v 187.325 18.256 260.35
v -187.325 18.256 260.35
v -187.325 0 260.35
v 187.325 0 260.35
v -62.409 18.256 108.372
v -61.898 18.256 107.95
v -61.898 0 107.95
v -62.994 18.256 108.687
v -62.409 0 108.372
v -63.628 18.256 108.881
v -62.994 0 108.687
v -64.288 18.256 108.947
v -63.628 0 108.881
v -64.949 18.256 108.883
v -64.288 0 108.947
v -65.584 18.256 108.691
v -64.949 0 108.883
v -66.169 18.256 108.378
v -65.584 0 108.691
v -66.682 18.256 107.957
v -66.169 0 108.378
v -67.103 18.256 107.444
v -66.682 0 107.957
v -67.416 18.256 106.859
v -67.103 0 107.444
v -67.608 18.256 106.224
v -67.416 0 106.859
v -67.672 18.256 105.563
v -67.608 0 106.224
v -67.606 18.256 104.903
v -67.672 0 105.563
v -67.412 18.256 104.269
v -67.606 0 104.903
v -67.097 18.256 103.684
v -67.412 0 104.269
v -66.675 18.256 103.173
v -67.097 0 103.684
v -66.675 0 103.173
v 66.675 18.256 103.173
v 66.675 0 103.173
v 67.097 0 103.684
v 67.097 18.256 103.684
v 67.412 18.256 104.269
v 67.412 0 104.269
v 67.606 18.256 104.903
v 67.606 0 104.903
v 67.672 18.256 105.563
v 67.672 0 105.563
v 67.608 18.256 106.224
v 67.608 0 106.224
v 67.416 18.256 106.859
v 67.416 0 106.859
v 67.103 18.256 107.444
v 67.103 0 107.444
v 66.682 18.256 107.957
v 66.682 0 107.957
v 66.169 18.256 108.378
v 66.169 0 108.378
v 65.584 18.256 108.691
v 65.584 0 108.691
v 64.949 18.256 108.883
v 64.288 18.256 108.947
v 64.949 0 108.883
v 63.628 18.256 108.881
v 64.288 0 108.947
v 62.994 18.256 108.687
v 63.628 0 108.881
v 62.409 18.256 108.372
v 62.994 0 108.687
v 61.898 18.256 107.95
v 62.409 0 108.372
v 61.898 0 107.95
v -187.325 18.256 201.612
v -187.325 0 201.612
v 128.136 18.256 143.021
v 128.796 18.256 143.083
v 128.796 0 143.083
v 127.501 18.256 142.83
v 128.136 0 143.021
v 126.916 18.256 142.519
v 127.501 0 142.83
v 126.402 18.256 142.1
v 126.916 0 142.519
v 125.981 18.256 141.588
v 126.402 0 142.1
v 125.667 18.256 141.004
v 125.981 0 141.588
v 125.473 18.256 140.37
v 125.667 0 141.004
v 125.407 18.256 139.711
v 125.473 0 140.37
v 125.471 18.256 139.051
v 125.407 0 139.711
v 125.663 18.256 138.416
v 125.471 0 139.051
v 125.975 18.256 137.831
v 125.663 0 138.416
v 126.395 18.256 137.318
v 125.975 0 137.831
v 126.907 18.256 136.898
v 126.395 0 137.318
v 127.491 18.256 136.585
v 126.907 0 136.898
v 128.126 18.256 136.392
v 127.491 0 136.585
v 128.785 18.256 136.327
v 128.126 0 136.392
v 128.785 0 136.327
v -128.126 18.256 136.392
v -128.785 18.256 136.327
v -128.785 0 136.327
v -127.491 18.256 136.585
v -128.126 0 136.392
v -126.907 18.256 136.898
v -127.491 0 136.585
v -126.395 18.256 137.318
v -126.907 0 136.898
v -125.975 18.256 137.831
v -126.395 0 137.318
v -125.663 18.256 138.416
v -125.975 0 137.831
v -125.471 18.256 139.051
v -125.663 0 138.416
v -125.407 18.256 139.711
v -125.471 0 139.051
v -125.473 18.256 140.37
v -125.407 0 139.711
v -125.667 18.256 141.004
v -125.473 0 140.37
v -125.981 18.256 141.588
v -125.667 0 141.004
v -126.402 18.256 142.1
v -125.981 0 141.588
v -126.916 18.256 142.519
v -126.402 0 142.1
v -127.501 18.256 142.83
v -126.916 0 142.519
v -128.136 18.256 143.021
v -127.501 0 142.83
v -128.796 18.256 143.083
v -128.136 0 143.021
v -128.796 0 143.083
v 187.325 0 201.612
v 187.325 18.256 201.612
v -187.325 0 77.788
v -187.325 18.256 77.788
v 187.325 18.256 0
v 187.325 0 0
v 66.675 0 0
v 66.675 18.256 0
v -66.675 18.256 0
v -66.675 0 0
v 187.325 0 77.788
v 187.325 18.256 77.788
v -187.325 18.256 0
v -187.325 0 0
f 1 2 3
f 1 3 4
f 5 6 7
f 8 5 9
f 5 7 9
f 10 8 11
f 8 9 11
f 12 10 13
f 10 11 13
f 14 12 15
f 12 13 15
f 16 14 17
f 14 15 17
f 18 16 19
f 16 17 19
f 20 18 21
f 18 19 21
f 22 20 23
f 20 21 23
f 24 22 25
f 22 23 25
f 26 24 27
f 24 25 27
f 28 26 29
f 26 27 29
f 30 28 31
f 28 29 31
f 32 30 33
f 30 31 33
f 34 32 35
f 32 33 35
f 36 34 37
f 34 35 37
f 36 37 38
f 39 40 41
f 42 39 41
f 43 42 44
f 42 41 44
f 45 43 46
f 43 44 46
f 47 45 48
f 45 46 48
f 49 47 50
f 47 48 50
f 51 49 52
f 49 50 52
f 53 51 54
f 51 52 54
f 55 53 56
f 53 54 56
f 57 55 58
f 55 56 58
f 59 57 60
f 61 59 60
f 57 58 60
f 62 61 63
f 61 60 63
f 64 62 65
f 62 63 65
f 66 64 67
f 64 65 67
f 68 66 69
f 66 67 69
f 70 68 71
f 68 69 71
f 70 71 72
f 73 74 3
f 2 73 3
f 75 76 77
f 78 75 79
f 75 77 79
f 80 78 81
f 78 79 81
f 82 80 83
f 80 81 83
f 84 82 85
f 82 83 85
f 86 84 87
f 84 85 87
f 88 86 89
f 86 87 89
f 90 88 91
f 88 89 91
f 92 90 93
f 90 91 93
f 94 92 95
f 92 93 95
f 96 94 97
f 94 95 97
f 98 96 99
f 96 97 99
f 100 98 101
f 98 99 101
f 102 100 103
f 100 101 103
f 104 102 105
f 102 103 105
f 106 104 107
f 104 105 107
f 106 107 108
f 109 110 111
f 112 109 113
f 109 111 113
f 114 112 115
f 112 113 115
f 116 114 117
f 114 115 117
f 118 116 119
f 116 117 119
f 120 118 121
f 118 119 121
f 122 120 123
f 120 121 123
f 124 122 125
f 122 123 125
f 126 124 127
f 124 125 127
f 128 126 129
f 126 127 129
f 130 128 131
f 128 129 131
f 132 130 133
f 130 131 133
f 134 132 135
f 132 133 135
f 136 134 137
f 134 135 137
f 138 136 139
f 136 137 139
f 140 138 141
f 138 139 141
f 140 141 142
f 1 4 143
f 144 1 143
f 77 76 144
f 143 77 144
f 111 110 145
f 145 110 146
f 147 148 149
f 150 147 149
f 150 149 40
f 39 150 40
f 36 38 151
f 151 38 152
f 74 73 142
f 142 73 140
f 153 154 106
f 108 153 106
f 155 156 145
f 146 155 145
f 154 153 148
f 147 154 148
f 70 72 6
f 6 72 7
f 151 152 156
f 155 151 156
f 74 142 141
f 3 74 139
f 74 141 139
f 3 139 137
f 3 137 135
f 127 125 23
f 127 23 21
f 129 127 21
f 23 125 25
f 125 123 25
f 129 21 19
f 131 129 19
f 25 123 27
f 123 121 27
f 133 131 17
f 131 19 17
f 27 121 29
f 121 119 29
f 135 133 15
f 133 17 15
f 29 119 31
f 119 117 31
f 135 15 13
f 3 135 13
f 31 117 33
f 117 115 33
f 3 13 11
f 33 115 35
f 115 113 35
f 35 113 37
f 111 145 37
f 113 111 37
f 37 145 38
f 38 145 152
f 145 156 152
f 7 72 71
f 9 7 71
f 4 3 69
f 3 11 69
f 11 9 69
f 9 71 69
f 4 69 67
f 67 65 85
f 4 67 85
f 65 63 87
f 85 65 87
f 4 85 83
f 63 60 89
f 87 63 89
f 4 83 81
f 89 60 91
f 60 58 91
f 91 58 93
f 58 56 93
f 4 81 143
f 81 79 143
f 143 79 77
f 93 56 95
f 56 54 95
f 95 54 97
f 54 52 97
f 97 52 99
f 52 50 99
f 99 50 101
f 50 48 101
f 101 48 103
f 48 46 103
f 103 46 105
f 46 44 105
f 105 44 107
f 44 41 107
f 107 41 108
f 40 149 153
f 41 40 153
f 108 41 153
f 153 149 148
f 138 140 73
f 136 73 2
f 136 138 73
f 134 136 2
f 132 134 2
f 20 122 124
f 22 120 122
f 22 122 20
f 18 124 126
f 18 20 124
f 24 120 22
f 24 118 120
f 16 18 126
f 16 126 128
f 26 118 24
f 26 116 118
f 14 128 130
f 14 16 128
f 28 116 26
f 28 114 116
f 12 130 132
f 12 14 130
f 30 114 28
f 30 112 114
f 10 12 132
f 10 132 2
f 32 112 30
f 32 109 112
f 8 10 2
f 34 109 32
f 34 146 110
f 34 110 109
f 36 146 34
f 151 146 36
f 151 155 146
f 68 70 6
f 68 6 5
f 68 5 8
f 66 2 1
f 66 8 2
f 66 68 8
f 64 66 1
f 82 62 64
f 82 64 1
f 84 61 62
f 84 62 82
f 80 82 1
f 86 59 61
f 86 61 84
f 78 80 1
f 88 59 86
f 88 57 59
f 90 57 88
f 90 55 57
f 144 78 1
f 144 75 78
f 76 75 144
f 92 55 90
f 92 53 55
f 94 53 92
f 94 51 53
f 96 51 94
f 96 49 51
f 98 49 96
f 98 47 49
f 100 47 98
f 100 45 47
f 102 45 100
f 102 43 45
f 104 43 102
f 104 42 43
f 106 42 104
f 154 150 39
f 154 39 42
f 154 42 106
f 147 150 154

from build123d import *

# Parameters (mm, degrees)
BOSS_EXTRUDE1_DEPTH         = 18.25625
CUT_EXTRUDE1_DEPTH          = 590.645135899
F_1_4_CLEARANCE_HOLE1_D     = 6.7564
F_1_4_CLEARANCE_HOLE1_DEPTH = 18.25625
SKETCH5_W                   = 374.65
SKETCH5_H                   = 298.45
CUT_EXTRUDE2_DEPTH          = 590.645135899


with BuildPart() as part:
    # Sketch1 → Boss-Extrude1 (new body)
    with BuildSketch(Plane(origin=(0, 0, 0), x_dir=(1, 0, 0), z_dir=(0, 1, 0))):
        Polygon((-187.325, -558.8), (187.325, -558.8), (187.325, 0), (66.675, 0), (66.675, -107.95), (-66.675, -107.95), (-66.675, 0), (-187.325, 0), align=None)
    extrude(amount=BOSS_EXTRUDE1_DEPTH)

    # Sketch2 → Cut-Extrude1 (cut, through all)
    with BuildSketch(Plane(origin=(0, 18.25625, 0), x_dir=(1, 0, 0), z_dir=(0, 1, 0))):
        Polygon((-187.325, -201.6125), (-125.4125, -139.7), (-187.325, -77.7875), align=None)
        Polygon((125.4125, -139.7), (187.325, -201.6125), (187.325, -77.7875), align=None)
    extrude(amount=-CUT_EXTRUDE1_DEPTH, mode=Mode.SUBTRACT)

    # 1/4 Clearance Hole1
    with Locations(Plane(origin=(0, 18.25625, 0), x_dir=(1, 0, 0), z_dir=(0, 1, 0))):
        with Locations((-64.29375, -105.56875), (64.29375, -105.56875), (-128.785398023, -139.705301977), (128.785398023, -139.705301977)):
            Hole(F_1_4_CLEARANCE_HOLE1_D / 2, depth=F_1_4_CLEARANCE_HOLE1_DEPTH)

    # Sketch5 → Cut-Extrude2 (cut, through all)
    with BuildSketch(Plane(origin=(0, 18.25625, 0), x_dir=(1, 0, 0), z_dir=(0, 1, 0))):
        with Locations((0, -409.575)):
            Rectangle(SKETCH5_W, SKETCH5_H)
    extrude(amount=-CUT_EXTRUDE2_DEPTH, mode=Mode.SUBTRACT)


solid = part.part
